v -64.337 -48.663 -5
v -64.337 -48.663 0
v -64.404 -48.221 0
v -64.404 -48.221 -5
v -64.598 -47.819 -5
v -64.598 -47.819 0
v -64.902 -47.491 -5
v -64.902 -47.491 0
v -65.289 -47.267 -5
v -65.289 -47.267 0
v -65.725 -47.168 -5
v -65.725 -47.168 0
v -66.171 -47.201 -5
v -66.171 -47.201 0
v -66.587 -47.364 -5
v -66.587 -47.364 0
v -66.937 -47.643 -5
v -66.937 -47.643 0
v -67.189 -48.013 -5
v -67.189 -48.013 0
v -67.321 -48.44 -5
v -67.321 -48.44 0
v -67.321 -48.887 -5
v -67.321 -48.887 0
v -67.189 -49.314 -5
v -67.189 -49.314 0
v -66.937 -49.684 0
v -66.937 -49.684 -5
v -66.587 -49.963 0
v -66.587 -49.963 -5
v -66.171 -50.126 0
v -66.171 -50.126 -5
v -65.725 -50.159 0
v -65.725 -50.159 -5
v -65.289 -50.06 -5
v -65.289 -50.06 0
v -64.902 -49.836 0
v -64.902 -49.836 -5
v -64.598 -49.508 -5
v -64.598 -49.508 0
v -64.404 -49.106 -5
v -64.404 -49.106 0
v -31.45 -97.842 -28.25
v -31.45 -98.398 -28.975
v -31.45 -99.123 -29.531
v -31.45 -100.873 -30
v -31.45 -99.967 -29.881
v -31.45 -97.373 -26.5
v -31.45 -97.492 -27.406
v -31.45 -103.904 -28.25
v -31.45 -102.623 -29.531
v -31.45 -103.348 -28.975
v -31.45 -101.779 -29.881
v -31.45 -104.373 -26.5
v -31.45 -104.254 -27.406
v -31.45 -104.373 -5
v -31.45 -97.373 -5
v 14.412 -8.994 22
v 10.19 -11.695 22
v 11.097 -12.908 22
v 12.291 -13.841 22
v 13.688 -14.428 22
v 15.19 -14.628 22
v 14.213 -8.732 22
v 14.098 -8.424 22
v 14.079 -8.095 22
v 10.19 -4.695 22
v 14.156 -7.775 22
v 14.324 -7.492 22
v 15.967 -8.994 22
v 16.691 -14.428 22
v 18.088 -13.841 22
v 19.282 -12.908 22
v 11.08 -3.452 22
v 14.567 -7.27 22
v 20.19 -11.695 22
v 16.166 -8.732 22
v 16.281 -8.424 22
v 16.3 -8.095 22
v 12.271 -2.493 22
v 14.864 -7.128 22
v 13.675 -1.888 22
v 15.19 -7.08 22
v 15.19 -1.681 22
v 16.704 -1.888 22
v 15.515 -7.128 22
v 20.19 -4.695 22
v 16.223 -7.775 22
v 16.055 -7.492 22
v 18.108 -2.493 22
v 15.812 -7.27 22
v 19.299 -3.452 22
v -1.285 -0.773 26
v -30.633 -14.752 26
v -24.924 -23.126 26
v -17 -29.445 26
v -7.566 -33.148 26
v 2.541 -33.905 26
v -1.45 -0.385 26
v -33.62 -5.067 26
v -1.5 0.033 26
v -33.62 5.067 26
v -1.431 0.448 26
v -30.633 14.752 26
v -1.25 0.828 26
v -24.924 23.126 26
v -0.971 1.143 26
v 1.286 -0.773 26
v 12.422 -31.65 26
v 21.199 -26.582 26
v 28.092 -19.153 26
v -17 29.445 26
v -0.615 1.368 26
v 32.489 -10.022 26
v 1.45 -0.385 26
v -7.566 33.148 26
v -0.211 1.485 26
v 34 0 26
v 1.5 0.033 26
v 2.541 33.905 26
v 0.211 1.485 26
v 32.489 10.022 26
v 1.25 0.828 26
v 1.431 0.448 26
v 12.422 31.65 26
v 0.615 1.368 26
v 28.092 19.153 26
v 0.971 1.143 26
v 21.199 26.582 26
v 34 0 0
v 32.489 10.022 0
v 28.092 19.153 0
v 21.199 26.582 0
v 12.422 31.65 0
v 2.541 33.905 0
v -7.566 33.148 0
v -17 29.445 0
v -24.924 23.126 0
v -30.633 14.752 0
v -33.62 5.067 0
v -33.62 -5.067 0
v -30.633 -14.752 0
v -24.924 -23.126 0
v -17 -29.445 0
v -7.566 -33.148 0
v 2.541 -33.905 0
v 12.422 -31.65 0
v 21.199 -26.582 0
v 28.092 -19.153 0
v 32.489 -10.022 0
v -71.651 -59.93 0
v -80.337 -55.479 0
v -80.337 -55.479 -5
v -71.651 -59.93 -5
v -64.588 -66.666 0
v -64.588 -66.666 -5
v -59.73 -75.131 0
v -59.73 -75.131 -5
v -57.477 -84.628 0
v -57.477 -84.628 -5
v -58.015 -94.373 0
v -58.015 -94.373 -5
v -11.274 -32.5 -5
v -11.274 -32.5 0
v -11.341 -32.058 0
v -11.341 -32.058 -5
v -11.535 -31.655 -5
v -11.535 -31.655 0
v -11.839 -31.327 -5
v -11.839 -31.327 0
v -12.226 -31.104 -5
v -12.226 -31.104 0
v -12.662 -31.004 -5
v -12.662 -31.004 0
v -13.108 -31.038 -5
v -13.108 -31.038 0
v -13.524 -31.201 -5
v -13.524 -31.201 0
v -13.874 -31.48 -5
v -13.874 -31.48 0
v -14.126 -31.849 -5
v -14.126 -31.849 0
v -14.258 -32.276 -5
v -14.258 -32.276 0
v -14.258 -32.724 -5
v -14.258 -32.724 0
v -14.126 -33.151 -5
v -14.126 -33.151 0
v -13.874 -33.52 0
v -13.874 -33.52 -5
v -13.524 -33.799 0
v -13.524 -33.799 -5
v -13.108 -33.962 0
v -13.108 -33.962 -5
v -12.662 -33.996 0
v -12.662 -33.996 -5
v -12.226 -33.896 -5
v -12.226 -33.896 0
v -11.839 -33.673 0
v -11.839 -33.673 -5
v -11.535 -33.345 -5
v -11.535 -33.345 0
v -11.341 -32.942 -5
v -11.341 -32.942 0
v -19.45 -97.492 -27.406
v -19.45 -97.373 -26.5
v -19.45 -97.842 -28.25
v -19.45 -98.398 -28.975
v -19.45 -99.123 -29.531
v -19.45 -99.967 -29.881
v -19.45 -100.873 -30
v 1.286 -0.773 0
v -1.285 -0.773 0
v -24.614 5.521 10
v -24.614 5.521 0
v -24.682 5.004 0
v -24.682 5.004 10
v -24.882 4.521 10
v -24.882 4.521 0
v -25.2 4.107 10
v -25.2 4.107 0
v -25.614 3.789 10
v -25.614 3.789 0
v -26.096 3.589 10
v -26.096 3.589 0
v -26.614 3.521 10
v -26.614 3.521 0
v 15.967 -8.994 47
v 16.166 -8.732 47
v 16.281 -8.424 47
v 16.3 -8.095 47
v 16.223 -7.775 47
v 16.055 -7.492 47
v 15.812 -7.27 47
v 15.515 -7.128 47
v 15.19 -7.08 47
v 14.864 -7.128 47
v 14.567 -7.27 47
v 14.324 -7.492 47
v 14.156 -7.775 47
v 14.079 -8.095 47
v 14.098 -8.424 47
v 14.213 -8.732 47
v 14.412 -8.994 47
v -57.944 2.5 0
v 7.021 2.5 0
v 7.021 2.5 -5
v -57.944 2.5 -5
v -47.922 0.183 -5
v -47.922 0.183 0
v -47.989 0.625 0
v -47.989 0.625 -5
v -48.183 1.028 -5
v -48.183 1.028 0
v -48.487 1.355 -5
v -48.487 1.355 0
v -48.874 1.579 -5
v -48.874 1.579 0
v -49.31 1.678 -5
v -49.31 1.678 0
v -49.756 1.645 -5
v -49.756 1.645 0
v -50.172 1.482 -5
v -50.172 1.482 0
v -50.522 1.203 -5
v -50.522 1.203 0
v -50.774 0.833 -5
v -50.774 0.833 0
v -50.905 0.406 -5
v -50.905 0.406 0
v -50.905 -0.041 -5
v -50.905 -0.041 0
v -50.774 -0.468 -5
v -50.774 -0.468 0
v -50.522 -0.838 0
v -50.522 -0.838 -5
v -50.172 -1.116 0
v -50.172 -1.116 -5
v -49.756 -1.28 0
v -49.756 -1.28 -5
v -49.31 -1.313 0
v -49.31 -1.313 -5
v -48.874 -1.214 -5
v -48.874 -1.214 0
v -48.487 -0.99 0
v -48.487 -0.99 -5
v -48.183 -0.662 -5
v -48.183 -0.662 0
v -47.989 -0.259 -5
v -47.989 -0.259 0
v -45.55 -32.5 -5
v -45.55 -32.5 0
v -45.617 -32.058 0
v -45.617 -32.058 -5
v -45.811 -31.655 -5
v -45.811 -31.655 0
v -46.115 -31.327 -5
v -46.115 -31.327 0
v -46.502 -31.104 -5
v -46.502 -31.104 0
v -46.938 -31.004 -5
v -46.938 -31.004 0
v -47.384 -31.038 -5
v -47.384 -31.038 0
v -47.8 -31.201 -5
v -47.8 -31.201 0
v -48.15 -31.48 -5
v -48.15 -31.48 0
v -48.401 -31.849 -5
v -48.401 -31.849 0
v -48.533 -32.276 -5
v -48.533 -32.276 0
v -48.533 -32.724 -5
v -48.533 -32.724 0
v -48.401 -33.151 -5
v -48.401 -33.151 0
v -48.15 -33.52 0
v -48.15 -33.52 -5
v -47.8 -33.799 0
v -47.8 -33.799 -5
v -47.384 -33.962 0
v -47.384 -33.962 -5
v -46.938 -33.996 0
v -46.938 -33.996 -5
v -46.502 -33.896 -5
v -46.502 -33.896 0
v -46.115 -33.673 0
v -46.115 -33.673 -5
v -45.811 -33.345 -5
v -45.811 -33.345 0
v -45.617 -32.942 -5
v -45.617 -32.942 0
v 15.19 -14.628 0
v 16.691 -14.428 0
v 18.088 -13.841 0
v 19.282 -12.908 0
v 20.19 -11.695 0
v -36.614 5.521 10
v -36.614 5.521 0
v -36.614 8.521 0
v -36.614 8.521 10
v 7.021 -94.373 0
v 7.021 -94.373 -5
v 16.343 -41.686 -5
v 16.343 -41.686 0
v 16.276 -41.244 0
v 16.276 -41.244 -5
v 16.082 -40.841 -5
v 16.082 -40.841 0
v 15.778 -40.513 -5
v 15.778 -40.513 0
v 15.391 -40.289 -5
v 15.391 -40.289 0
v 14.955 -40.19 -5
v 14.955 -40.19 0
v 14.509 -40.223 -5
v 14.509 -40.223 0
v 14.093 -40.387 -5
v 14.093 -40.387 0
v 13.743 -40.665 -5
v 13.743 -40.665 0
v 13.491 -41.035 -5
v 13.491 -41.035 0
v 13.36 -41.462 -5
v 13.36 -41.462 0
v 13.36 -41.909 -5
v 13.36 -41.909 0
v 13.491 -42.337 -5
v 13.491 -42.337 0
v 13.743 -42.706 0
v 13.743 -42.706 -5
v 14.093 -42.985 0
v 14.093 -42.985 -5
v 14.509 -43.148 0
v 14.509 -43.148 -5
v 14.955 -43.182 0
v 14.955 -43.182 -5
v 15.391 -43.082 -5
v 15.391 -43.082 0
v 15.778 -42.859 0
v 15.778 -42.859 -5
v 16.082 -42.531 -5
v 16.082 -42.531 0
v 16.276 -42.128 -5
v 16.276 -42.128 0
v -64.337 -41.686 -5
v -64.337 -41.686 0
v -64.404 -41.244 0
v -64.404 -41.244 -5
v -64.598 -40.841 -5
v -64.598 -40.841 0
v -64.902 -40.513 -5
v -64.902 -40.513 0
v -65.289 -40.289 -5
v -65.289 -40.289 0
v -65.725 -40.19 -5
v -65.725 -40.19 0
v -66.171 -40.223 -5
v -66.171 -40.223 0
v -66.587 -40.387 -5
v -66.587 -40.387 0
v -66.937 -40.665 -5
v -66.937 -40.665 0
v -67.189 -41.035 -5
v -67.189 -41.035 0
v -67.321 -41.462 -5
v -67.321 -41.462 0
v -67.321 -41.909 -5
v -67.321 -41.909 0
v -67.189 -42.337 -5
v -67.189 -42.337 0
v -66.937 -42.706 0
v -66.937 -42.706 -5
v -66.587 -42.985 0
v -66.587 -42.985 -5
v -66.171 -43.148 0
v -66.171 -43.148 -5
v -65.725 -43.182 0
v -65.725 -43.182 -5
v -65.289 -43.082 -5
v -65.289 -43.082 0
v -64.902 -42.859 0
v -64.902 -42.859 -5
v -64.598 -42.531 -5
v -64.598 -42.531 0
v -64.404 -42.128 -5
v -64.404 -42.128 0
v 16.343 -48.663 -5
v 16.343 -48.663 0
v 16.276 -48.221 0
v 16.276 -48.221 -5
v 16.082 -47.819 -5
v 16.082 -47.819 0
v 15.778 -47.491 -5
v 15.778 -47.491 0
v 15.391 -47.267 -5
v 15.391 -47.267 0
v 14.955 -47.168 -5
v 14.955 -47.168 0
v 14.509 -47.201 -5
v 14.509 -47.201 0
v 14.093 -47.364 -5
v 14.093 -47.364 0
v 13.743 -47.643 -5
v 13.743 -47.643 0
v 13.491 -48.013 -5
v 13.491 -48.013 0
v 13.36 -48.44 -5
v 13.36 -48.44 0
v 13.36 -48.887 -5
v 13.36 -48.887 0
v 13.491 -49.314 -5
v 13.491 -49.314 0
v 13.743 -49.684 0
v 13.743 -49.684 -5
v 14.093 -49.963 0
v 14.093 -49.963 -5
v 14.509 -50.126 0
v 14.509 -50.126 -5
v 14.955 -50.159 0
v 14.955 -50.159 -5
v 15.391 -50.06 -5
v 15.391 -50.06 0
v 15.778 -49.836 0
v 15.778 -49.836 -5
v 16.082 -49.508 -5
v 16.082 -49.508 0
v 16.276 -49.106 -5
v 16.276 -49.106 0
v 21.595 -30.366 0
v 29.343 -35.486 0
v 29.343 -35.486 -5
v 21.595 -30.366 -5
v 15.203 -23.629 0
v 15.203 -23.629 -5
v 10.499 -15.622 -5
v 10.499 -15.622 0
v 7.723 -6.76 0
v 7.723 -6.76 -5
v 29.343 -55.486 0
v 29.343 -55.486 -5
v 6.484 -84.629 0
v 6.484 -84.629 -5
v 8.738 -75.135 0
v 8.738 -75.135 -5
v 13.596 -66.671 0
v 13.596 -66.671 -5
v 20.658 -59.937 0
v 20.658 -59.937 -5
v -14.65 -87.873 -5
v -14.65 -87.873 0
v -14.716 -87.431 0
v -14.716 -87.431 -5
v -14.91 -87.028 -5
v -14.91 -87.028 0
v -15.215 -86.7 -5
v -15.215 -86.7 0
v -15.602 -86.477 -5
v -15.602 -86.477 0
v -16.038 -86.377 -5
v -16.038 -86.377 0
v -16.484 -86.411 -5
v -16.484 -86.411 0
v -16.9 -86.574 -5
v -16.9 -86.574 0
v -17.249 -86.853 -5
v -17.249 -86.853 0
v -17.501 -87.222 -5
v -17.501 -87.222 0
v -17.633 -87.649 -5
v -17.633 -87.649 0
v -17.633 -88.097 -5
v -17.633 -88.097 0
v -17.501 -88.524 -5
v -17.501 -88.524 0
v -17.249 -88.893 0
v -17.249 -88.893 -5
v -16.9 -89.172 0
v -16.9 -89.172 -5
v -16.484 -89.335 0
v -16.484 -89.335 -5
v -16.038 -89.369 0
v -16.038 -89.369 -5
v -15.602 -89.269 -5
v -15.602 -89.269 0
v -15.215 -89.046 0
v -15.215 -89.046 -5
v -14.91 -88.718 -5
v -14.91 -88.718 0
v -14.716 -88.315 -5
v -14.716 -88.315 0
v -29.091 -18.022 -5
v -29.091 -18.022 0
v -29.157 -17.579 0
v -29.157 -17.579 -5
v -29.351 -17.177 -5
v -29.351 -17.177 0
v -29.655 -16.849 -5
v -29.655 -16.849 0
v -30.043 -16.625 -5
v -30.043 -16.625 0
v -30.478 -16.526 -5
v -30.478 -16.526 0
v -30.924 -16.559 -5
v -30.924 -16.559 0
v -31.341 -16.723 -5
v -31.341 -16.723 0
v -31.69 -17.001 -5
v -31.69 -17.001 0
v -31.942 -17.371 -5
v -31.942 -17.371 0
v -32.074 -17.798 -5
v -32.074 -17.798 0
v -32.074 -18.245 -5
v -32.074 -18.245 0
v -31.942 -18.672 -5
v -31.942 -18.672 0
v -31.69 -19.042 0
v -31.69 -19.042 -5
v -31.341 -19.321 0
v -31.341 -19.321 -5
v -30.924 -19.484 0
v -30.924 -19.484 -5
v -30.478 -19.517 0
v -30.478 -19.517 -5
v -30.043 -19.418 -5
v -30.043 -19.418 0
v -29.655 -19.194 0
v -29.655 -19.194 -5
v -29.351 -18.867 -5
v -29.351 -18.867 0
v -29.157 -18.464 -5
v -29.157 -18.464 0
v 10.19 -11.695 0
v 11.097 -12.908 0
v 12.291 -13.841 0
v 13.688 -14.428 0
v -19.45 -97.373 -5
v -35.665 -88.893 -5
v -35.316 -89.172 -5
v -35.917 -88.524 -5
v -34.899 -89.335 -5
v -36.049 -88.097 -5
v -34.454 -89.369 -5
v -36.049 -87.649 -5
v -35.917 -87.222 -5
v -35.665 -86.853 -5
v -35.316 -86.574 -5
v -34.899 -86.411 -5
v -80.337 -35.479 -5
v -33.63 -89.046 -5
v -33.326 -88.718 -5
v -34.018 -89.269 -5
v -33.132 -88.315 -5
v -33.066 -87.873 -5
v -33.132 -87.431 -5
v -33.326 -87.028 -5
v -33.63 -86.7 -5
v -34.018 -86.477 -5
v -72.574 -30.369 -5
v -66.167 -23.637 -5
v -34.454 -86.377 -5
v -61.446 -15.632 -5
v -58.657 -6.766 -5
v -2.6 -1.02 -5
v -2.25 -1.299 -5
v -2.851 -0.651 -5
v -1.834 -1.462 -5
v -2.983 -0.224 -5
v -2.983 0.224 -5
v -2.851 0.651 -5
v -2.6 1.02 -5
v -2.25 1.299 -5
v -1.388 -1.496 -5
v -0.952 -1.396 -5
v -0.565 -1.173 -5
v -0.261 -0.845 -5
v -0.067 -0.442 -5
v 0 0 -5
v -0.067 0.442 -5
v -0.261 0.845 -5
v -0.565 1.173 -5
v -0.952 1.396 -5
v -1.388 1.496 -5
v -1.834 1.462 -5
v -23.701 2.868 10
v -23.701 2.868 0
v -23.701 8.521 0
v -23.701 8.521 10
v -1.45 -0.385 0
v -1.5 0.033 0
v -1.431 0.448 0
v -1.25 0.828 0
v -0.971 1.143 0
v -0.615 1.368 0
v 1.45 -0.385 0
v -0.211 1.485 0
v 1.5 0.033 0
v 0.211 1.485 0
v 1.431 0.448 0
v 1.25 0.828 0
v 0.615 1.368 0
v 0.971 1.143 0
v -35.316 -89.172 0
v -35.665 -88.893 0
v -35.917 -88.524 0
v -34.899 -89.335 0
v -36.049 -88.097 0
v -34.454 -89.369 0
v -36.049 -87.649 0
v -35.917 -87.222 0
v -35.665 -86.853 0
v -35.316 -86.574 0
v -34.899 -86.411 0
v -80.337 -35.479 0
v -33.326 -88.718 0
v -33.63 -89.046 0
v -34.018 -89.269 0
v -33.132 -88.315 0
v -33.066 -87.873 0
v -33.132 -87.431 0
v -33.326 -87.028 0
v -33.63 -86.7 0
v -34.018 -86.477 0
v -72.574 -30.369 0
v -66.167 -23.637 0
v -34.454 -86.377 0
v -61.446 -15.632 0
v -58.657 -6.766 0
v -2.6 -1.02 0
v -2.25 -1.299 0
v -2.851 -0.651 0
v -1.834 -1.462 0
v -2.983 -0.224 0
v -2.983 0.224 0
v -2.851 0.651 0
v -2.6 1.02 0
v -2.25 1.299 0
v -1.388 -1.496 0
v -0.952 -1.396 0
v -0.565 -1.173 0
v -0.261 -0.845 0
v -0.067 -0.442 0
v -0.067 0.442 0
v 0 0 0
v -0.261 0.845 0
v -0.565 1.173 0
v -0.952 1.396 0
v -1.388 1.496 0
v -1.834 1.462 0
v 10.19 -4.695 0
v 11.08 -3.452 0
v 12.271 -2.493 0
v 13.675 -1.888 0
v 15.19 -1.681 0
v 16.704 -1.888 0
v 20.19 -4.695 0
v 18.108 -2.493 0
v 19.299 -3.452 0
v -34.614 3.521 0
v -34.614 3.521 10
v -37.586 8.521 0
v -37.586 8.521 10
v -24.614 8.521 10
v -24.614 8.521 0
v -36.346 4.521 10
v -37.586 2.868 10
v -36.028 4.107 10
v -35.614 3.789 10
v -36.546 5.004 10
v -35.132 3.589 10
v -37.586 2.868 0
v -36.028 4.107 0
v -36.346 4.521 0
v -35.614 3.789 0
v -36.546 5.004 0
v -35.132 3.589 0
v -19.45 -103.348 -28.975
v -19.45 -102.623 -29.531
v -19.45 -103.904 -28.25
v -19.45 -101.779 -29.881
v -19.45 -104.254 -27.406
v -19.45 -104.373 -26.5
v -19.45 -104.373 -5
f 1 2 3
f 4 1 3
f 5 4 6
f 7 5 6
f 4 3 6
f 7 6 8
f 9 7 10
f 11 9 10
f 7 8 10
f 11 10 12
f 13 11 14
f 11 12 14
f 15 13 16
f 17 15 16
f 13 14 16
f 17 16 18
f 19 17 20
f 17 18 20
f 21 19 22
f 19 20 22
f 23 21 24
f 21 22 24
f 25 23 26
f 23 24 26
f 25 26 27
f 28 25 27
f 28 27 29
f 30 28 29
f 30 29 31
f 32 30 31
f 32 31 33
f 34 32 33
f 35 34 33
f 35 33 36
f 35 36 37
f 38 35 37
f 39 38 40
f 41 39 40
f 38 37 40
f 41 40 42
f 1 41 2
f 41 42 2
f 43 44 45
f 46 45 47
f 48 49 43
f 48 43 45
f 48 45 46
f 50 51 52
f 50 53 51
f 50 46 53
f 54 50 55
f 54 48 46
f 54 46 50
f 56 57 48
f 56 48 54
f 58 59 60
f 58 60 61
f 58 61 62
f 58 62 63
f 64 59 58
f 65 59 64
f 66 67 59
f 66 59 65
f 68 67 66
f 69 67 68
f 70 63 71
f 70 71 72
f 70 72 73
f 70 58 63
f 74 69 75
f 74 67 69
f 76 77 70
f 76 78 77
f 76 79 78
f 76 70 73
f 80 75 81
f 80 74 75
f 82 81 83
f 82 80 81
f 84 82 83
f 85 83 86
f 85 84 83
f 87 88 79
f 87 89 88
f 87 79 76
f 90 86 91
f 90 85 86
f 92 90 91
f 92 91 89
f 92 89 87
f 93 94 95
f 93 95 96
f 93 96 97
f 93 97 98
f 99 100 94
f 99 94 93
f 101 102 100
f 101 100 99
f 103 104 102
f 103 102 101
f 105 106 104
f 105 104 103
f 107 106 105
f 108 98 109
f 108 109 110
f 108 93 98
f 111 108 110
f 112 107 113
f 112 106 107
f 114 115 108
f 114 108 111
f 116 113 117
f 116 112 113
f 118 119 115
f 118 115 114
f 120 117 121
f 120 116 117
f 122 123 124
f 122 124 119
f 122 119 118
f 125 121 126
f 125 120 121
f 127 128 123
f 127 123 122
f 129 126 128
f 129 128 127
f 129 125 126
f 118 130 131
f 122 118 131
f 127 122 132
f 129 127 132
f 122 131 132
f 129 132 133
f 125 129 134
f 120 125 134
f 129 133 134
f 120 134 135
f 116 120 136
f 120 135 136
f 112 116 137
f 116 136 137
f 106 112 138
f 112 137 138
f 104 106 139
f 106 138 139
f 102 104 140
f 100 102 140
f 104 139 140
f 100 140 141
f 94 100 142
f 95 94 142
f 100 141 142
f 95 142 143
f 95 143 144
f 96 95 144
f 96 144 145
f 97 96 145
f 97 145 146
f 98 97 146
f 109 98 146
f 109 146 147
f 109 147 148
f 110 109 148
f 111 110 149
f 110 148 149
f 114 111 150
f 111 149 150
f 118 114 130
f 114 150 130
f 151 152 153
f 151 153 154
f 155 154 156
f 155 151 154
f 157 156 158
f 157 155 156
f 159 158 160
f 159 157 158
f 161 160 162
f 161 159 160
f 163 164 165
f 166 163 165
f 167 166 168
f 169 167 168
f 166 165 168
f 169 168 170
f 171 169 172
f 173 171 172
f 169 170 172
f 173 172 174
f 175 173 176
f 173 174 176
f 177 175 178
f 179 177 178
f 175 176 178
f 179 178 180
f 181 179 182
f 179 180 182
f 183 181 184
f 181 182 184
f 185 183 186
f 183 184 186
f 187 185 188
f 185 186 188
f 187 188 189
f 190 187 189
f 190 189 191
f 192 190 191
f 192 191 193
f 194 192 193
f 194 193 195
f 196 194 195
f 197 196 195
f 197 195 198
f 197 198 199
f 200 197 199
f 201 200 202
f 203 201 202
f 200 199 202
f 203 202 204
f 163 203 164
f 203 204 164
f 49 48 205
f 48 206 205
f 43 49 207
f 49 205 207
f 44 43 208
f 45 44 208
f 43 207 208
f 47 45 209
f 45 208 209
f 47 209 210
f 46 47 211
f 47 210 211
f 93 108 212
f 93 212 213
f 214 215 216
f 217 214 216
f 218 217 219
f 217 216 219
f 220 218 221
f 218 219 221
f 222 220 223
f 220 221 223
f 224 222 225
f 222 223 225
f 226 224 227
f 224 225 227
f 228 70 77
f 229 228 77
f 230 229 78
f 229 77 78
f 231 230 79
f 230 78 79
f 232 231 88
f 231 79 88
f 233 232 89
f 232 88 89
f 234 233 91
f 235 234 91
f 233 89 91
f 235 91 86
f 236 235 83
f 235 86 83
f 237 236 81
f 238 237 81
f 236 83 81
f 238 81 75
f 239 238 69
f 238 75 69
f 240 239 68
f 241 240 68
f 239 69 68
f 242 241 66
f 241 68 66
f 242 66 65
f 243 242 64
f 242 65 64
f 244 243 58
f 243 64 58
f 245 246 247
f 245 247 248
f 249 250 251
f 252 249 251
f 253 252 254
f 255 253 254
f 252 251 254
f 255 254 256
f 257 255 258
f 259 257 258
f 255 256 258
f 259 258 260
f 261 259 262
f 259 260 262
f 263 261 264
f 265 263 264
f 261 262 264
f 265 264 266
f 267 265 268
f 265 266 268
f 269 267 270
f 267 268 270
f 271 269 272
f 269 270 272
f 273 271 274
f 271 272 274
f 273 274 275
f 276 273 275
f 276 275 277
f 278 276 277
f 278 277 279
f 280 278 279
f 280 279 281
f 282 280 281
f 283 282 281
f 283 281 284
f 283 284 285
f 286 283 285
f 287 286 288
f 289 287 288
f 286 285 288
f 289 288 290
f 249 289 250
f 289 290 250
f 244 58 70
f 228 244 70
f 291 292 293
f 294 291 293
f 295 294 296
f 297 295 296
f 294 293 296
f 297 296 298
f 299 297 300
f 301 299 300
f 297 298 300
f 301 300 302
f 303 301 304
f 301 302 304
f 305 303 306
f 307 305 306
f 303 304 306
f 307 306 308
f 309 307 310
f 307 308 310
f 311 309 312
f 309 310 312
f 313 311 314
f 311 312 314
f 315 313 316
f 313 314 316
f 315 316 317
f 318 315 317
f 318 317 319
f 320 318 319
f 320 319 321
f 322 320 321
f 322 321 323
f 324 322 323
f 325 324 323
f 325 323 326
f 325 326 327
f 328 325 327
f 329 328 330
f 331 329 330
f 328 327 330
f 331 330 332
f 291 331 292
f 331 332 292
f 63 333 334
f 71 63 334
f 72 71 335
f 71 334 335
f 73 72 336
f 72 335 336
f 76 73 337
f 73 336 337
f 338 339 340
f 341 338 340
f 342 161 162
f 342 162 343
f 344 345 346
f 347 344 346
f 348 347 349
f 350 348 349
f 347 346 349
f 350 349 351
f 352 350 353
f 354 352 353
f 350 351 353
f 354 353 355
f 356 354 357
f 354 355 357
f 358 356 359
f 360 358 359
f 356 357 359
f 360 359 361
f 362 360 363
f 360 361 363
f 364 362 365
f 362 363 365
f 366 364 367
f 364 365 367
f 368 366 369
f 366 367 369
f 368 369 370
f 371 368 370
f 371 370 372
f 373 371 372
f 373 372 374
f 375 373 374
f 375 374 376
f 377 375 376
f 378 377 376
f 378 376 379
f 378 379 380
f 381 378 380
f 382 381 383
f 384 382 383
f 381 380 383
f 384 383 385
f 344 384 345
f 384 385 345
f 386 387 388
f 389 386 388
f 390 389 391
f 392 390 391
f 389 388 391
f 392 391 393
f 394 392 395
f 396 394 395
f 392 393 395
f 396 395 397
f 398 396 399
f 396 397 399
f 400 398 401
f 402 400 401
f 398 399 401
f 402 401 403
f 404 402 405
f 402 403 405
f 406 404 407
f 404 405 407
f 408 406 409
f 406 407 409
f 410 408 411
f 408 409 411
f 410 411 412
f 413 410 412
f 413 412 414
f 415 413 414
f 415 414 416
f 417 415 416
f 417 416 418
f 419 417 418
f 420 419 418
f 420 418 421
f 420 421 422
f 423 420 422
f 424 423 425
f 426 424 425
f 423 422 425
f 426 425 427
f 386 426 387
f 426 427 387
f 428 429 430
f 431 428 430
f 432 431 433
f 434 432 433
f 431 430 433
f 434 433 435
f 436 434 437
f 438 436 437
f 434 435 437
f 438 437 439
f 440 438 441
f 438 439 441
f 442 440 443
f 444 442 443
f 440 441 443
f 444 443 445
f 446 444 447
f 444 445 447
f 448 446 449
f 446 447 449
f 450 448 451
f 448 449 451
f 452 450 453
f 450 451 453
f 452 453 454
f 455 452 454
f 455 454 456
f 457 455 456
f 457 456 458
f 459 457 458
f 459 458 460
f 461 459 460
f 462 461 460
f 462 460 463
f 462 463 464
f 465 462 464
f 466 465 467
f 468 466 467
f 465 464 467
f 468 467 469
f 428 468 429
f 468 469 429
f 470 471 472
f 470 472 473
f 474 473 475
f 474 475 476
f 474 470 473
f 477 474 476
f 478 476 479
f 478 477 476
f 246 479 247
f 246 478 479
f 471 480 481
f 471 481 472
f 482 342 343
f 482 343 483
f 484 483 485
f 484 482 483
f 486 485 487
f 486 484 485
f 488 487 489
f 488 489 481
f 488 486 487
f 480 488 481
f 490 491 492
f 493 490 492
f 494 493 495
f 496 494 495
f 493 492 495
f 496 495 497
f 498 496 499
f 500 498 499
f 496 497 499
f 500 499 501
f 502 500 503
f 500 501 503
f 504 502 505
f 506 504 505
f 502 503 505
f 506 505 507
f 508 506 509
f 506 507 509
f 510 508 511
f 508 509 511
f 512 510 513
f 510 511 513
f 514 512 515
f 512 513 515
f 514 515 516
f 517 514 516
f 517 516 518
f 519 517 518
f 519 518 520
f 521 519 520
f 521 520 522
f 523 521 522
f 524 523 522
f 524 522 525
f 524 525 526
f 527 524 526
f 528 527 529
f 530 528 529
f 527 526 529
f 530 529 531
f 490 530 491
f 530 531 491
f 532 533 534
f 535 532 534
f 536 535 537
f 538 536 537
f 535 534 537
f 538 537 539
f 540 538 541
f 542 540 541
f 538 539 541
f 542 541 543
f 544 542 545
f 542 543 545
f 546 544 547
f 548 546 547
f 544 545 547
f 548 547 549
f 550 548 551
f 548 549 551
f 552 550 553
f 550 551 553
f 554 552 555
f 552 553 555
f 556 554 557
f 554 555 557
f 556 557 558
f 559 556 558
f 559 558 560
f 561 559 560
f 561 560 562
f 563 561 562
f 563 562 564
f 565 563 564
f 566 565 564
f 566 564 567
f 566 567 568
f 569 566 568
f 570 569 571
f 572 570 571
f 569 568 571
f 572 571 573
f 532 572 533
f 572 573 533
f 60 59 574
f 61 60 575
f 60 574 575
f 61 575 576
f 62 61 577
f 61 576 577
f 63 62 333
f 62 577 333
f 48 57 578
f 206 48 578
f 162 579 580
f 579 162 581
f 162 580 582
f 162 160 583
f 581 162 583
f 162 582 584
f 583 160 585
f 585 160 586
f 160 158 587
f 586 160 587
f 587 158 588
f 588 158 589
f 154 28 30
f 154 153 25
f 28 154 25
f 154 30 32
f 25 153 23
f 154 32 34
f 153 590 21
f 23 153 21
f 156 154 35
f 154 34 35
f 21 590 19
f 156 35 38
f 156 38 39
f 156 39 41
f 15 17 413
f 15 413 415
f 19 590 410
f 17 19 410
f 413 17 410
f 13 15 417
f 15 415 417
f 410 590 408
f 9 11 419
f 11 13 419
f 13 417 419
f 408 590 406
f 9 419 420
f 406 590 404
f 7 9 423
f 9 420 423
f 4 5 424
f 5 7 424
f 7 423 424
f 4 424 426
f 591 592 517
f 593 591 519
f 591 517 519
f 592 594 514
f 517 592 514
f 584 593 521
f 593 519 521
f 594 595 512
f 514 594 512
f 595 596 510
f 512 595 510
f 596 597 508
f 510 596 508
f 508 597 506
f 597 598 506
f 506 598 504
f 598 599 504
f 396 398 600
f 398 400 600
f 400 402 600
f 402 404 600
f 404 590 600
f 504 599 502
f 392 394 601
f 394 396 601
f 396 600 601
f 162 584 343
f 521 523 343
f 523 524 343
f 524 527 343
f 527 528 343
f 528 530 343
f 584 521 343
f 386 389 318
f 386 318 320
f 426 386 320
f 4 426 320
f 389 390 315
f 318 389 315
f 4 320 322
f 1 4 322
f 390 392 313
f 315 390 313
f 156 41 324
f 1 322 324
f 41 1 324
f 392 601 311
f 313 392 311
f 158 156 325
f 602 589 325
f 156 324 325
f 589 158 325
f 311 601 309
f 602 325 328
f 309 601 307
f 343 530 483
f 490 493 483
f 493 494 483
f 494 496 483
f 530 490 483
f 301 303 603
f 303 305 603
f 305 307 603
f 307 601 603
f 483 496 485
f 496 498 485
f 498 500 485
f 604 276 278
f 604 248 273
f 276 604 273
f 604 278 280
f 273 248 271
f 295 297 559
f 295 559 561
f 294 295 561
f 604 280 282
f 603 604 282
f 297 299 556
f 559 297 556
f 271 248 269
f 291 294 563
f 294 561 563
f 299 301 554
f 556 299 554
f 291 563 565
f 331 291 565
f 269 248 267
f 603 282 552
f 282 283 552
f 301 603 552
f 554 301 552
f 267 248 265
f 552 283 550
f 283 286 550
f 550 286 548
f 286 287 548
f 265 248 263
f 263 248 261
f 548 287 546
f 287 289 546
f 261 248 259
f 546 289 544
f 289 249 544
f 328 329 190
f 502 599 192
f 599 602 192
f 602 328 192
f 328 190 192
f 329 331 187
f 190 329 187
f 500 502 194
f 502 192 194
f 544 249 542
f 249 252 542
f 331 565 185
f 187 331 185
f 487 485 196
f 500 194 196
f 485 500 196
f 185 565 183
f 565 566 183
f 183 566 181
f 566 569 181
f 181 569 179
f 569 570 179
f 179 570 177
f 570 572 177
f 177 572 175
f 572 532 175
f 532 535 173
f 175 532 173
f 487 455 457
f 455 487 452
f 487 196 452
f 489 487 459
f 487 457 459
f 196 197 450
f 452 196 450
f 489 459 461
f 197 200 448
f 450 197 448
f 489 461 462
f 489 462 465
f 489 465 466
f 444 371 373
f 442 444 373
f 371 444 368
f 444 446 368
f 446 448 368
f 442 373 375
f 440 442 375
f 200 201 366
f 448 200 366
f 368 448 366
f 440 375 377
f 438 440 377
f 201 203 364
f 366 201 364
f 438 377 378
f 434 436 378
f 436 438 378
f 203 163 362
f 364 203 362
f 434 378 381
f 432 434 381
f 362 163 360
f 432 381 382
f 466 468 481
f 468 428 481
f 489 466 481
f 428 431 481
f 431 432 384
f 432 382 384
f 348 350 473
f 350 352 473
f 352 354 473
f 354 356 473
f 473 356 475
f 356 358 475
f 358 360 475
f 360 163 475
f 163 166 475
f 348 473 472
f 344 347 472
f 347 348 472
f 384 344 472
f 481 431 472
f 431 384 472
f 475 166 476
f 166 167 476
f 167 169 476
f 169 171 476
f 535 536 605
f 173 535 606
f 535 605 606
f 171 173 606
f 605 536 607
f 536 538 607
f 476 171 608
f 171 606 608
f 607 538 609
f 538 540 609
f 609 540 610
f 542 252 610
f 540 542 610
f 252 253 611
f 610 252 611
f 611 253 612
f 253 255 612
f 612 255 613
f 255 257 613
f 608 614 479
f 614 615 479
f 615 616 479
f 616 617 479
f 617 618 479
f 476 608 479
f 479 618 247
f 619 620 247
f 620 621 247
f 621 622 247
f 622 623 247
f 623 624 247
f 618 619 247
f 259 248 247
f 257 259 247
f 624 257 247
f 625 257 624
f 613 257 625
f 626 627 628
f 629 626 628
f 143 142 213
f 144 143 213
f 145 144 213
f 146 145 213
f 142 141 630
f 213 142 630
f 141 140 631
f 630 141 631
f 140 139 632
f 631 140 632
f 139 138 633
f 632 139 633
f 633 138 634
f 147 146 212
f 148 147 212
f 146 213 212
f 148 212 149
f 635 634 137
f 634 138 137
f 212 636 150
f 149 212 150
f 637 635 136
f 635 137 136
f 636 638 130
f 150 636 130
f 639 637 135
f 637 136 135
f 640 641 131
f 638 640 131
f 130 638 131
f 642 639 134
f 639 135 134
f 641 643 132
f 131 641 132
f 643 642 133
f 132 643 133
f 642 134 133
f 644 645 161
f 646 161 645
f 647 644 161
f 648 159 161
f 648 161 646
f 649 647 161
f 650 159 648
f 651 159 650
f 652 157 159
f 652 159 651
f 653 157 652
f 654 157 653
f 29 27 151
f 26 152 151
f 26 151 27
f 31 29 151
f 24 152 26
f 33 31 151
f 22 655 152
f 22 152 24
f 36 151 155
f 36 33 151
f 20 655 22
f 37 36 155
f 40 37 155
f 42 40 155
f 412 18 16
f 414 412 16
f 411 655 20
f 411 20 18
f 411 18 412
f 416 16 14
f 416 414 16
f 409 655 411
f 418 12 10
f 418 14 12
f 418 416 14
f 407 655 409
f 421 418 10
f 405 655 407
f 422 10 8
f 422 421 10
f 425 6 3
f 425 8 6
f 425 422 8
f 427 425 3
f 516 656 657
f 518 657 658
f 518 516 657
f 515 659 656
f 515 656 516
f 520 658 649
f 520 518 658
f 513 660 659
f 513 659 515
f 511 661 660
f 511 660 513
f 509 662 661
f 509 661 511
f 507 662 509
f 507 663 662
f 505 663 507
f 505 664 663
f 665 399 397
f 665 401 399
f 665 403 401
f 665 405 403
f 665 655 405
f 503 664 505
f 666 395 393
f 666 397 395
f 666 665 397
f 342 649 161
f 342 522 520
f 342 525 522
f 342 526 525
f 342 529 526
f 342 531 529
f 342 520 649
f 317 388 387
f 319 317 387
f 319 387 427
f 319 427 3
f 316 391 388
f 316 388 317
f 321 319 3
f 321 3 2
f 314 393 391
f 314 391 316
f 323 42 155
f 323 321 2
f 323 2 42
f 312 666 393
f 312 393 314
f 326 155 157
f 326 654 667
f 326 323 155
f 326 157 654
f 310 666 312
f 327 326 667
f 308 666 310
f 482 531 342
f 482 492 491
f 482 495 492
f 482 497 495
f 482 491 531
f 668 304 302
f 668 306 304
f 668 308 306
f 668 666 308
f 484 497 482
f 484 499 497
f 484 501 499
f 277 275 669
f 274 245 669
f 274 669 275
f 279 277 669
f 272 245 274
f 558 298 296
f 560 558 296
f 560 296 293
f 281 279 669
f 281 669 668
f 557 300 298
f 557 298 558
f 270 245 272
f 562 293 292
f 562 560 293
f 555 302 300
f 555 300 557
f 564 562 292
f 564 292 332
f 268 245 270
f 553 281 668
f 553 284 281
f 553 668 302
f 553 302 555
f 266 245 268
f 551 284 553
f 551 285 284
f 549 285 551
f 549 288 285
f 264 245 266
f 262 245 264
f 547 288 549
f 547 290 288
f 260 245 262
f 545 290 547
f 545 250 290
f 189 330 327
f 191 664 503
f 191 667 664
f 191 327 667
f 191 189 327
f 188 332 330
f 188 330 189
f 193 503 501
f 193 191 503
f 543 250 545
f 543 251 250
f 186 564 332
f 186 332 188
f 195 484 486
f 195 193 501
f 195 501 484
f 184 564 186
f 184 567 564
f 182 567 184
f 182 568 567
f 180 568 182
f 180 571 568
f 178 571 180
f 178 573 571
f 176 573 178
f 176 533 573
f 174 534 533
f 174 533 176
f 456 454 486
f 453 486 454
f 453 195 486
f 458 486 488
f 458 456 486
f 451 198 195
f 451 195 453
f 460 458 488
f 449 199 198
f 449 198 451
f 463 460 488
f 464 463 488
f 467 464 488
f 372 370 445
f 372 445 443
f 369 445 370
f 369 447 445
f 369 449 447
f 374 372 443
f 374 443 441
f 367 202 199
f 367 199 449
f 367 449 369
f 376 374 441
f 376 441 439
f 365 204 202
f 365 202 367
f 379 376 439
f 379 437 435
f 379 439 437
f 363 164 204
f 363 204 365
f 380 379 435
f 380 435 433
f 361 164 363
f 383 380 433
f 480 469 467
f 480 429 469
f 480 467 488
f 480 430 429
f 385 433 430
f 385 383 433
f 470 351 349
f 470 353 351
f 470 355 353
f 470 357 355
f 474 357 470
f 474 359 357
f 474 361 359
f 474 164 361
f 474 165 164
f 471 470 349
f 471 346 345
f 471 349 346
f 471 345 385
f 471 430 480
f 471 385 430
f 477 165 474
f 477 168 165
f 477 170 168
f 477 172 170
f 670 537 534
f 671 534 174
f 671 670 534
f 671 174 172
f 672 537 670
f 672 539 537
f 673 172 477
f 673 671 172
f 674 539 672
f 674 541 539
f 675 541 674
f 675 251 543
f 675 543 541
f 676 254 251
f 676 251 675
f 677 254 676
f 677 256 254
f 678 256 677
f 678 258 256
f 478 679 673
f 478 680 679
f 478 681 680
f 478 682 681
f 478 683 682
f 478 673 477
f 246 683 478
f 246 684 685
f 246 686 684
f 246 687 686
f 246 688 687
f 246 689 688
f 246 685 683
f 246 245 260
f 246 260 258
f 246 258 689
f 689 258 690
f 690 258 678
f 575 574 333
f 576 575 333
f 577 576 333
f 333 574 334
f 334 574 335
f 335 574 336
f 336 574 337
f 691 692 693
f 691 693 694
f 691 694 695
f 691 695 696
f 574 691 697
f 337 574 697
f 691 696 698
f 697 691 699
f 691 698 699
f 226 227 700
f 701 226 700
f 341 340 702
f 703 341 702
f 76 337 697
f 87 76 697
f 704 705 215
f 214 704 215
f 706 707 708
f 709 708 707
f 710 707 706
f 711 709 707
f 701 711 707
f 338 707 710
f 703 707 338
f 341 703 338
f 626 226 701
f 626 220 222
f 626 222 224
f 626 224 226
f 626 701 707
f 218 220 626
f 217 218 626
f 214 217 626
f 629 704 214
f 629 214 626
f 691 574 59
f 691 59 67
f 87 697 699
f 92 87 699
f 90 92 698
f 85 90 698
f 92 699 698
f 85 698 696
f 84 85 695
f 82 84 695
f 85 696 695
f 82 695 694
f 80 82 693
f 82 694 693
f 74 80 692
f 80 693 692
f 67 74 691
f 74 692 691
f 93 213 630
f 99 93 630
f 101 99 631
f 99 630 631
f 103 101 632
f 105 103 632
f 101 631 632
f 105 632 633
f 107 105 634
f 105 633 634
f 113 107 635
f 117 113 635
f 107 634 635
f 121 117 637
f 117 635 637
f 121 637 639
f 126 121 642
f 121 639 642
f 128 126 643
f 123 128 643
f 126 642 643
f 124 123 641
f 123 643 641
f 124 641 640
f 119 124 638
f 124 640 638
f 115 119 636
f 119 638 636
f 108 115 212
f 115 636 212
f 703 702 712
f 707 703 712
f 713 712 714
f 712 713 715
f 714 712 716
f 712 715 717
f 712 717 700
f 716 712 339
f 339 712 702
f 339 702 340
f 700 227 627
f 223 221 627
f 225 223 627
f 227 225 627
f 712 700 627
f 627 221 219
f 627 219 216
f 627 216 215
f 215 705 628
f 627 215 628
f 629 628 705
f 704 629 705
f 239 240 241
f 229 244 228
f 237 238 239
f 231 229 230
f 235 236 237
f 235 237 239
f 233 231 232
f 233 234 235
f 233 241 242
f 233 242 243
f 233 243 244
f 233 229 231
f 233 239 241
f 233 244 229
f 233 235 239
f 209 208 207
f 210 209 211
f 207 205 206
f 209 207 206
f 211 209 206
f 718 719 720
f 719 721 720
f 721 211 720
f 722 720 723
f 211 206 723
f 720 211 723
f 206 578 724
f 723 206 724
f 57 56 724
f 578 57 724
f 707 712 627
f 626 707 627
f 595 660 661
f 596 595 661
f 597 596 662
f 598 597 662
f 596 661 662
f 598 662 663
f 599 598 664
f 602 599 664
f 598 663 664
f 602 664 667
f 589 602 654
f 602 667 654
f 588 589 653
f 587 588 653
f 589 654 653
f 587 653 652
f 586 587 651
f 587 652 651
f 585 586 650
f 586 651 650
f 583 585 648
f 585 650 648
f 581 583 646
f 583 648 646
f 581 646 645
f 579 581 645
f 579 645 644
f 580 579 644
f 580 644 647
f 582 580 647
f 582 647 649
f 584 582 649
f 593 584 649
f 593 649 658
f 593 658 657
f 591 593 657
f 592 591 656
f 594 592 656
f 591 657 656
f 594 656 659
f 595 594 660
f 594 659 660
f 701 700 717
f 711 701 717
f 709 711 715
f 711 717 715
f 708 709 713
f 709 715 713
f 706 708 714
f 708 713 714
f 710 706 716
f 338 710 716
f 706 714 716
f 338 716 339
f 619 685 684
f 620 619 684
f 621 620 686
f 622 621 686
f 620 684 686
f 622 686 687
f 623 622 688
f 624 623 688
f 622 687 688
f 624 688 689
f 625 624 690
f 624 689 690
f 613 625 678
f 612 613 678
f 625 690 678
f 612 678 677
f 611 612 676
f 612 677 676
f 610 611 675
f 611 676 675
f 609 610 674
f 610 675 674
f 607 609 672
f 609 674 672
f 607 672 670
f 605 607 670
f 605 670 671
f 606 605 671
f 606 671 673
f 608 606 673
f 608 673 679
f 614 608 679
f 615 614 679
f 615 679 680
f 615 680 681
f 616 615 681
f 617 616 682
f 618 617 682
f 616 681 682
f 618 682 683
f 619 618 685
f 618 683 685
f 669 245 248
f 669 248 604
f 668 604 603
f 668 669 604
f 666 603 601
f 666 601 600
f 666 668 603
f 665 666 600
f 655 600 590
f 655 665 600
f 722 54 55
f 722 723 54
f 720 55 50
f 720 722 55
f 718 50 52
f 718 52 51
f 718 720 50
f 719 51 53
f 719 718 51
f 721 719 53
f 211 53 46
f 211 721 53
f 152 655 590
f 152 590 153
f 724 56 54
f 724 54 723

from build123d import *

# Parameters (mm, degrees)
F0_R      = 34
F1_DEPTH  = 26
F2_DEPTH  = 26
F3_W      = 10
F3_H      = 7
F4_DEPTH  = 22
F6_DEPTH  = 17
F7_R      = 1.5
F8_DEPTH  = 5
F9_W      = 12
F9_H      = 7
F10_DEPTH = 25
F11_R     = 3.49999
F12_DEPTH = 25
F14_DEPTH = 10


# Not quite as in the source:
# - a fillet or chamfer is up to 0.001 mm smaller than in the source, because OpenCascade refuses the exact size


with BuildPart() as f1:
    # F0 (on Top) → F1 (new body)
    with BuildSketch(Plane.XY):
        Circle(F0_R)
        with BuildLine():
            ThreePointArc((-1.2855, -0.7729746115), (0, 1.5), (1.2855, -0.7729746115))
            Line((1.2855, -0.7729746115), (-1.2855, -0.7729746115))
        make_face(mode=Mode.SUBTRACT)
    extrude(amount=F1_DEPTH)

    # F0 (on Top) → F2 (join)
    with BuildSketch(Plane.XY):
        Circle(F0_R)
        with BuildLine():
            ThreePointArc((-1.2855, -0.7729746115), (0, 1.5), (1.2855, -0.7729746115))
            Line((1.2855, -0.7729746115), (-1.2855, -0.7729746115))
        make_face(mode=Mode.SUBTRACT)
    extrude(amount=F2_DEPTH)


with BuildPart() as f4:
    # F3 (on Top) → F4 (new body)
    with BuildSketch(Plane.XY):
        with BuildLine():
            ThreePointArc((15.1895321906, -1.681498219), (12.2706510675, -2.4930327252), (10.1895321906, -4.6947137841))
            Line((10.1895321906, -4.6947137841), (20.1895321906, -4.6947137841))
            ThreePointArc((20.1895321906, -4.6947137841), (18.1084133136, -2.4930327252), (15.1895321906, -1.681498219))
        make_face()
        with BuildLine():
            Line((20.1895321906, -11.6947137841), (10.1895321906, -11.6947137841))
            ThreePointArc((10.1895321906, -11.6947137841), (12.2910870504, -13.8405250788), (15.1895321906, -14.6279606067))
            ThreePointArc((15.1895321906, -14.6279606067), (18.0879773307, -13.8405250788), (20.1895321906, -11.6947137841))
        make_face()
        with Locations((15.1895321906, -8.1947137841)):
            Rectangle(F3_W, F3_H)
    extrude(amount=F4_DEPTH)

    # F5 (on face) → F6 (join)
    with BuildSketch(Plane.XY.offset(22)):
        with BuildLine():
            Line((14.4120321906, -8.9939126017), (15.9670321906, -8.9939126017))
            ThreePointArc((15.9670321906, -8.9939126017), (15.1895321906, -7.0797137841), (14.4120321906, -8.9939126017))
        make_face()
    extrude(amount=F6_DEPTH)

    # F5 (on face) → F12 (join)
    with BuildSketch(Plane.XY.offset(22)):
        with BuildLine():
            Line((14.4120321906, -8.9939126017), (15.9670321906, -8.9939126017))
            ThreePointArc((15.9670321906, -8.9939126017), (15.1895321906, -7.0797137841), (14.4120321906, -8.9939126017))
        make_face()
    extrude(amount=F12_DEPTH)


with BuildPart() as f8:
    # F7 (on Top) → F8 (new body)
    with BuildSketch(Plane.XY):
        with BuildLine():
            Line((7.0208405241, 2.5), (-57.9437288691, 2.5))
            ThreePointArc((-57.9437288691, 2.5), (-63.5781988321, -19.7690987419), (-80.3373921663, -35.4786324501))
            Line((-80.3373921663, -35.4786324501), (-80.3373921663, -55.4786324501))
            ThreePointArc((-80.3373921663, -55.4786324501), (-61.8533257996, -70.7229983964), (-58.0151594759, -94.3729430437))
            Line((-58.0151594759, -94.3729430437), (-57.9791594759, -94.3729430437))
            Line((-57.9791594759, -94.3729430437), (7.0208405241, -94.3729430437))
            ThreePointArc((7.0208405241, -94.3729430437), (10.8617640259, -70.7277326236), (29.3427532497, -55.4862856296))
            Line((29.3427532497, -55.4862856296), (29.3427532497, -35.4862856296))
            ThreePointArc((29.3427532497, -35.4862856296), (12.6227799412, -19.7597925818), (7.0208405241, 2.5))
        make_face()
        with Locations((-34.5656405118, -87.8729430437)):
            Circle(F7_R, mode=Mode.SUBTRACT)
        with Locations((-65.8373921663, -48.6634840438)):
            Circle(F7_R, mode=Mode.SUBTRACT)
        with Locations((-16.1498492515, -87.8729430437)):
            Circle(F7_R, mode=Mode.SUBTRACT)
        with Locations((14.8427532497, -48.6634840438)):
            Circle(F7_R, mode=Mode.SUBTRACT)
        with Locations((-65.8373921663, -41.6857580474)):
            Circle(F7_R, mode=Mode.SUBTRACT)
        with Locations((-47.0499843359, -32.5)):
            Circle(F7_R, mode=Mode.SUBTRACT)
        with Locations((-30.5905751884, -18.0216301233)):
            Circle(F7_R, mode=Mode.SUBTRACT)
        with Locations((-49.4220566393, 0.1826457996)):
            Circle(F7_R, mode=Mode.SUBTRACT)
        with Locations((-12.7742653713, -32.5)):
            Circle(F7_R, mode=Mode.SUBTRACT)
        with Locations((14.8427532497, -41.6857580474)):
            Circle(F7_R, mode=Mode.SUBTRACT)
        with Locations((-1.5, 0)):
            Circle(F7_R, mode=Mode.SUBTRACT)
    extrude(amount=-F8_DEPTH)


with BuildPart() as f10:
    # F9 (on face) → F10 (new body)
    with BuildSketch(Plane(origin=(0, 0, -5), x_dir=(1, 0, 0), z_dir=(0, 0, -1))):
        with Locations((-25.4498492515, 100.8729430437)):
            Rectangle(F9_W, F9_H)
    extrude(amount=F10_DEPTH)

    # F11 (radius 3.5 in the source; OpenCascade refuses exactly that, so slightly less here)
    f11_edges = [f10.edges().sort_by_distance(p)[0] for p in [
        (-25.449849, -104.372943, -30),
        (-25.449849, -97.372943, -30),
    ]]
    fillet(f11_edges, radius=F11_R)


with BuildPart() as f14:
    # F13 (on Top) → F14 (new body)
    with BuildSketch(Plane.XY):
        with BuildLine():
            Line((-26.6139002144, 3.5212130751), (-34.6139002144, 3.5212130751))
            ThreePointArc((-34.6139002144, 3.5212130751), (-36.0281137768, 4.1069995128), (-36.6139002144, 5.5212130751))
            Line((-36.6139002144, 5.5212130751), (-36.6139002144, 8.5212130751))
            Line((-36.6139002144, 8.5212130751), (-37.5863661141, 8.5212130751))
            Line((-37.5863661141, 8.5212130751), (-37.5863661141, 2.867825795))
            Line((-37.5863661141, 2.867825795), (-23.7007507206, 2.867825795))
            Line((-23.7007507206, 2.867825795), (-23.7007507206, 8.5212130751))
            Line((-23.7007507206, 8.5212130751), (-24.6139002144, 8.5212130751))
            Line((-24.6139002144, 8.5212130751), (-24.6139002144, 5.5212130751))
            ThreePointArc((-24.6139002144, 5.5212130751), (-25.1996866521, 4.1069995128), (-26.6139002144, 3.5212130751))
        make_face()
    extrude(amount=F14_DEPTH)


solid = Compound([f1.part, f4.part, f8.part, f10.part, f14.part])
